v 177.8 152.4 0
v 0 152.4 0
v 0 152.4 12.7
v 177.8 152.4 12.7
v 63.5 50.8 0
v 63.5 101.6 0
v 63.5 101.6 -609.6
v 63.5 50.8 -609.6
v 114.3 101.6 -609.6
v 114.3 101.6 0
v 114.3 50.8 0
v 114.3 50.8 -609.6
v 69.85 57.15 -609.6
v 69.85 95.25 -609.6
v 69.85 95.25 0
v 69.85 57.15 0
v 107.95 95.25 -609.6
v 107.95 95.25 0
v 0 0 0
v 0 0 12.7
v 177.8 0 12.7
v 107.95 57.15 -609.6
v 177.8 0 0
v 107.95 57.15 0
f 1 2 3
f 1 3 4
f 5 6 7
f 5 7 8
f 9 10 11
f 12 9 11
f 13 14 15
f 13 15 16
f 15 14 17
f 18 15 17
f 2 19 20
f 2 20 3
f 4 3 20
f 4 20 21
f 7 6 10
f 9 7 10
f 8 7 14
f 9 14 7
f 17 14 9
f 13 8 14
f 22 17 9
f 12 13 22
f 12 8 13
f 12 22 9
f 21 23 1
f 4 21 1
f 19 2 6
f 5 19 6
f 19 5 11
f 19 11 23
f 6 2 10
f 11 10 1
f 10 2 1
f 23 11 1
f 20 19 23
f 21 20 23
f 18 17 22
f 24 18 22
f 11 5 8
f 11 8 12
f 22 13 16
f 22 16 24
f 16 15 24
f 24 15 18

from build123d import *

# Parameters (mm, degrees)
F0_W     = 177.8
F0_H     = 152.4
F1_DEPTH = 12.7
F2_W     = 50.8
F2_H     = 50.8
F2_W_2   = 38.1
F2_H_2   = 38.1
F3_DEPTH = 609.6


with BuildPart() as f1:
    # F0 (on Top) → F1 (new body)
    with BuildSketch(Plane.XY):
        with Locations((88.9, 76.2)):
            Rectangle(F0_W, F0_H)
    extrude(amount=F1_DEPTH)

    # F2 (on face) → F3 (join)
    with BuildSketch(Plane(origin=(0, 0, 0), x_dir=(1, 0, 0), z_dir=(0, 0, -1))):
        with Locations((88.9, -76.2)):
            Rectangle(F2_W, F2_H)
        with Locations((88.9, -76.2)):
            Rectangle(F2_W_2, F2_H_2, mode=Mode.SUBTRACT)
    extrude(amount=F3_DEPTH)


solid = f1.part
